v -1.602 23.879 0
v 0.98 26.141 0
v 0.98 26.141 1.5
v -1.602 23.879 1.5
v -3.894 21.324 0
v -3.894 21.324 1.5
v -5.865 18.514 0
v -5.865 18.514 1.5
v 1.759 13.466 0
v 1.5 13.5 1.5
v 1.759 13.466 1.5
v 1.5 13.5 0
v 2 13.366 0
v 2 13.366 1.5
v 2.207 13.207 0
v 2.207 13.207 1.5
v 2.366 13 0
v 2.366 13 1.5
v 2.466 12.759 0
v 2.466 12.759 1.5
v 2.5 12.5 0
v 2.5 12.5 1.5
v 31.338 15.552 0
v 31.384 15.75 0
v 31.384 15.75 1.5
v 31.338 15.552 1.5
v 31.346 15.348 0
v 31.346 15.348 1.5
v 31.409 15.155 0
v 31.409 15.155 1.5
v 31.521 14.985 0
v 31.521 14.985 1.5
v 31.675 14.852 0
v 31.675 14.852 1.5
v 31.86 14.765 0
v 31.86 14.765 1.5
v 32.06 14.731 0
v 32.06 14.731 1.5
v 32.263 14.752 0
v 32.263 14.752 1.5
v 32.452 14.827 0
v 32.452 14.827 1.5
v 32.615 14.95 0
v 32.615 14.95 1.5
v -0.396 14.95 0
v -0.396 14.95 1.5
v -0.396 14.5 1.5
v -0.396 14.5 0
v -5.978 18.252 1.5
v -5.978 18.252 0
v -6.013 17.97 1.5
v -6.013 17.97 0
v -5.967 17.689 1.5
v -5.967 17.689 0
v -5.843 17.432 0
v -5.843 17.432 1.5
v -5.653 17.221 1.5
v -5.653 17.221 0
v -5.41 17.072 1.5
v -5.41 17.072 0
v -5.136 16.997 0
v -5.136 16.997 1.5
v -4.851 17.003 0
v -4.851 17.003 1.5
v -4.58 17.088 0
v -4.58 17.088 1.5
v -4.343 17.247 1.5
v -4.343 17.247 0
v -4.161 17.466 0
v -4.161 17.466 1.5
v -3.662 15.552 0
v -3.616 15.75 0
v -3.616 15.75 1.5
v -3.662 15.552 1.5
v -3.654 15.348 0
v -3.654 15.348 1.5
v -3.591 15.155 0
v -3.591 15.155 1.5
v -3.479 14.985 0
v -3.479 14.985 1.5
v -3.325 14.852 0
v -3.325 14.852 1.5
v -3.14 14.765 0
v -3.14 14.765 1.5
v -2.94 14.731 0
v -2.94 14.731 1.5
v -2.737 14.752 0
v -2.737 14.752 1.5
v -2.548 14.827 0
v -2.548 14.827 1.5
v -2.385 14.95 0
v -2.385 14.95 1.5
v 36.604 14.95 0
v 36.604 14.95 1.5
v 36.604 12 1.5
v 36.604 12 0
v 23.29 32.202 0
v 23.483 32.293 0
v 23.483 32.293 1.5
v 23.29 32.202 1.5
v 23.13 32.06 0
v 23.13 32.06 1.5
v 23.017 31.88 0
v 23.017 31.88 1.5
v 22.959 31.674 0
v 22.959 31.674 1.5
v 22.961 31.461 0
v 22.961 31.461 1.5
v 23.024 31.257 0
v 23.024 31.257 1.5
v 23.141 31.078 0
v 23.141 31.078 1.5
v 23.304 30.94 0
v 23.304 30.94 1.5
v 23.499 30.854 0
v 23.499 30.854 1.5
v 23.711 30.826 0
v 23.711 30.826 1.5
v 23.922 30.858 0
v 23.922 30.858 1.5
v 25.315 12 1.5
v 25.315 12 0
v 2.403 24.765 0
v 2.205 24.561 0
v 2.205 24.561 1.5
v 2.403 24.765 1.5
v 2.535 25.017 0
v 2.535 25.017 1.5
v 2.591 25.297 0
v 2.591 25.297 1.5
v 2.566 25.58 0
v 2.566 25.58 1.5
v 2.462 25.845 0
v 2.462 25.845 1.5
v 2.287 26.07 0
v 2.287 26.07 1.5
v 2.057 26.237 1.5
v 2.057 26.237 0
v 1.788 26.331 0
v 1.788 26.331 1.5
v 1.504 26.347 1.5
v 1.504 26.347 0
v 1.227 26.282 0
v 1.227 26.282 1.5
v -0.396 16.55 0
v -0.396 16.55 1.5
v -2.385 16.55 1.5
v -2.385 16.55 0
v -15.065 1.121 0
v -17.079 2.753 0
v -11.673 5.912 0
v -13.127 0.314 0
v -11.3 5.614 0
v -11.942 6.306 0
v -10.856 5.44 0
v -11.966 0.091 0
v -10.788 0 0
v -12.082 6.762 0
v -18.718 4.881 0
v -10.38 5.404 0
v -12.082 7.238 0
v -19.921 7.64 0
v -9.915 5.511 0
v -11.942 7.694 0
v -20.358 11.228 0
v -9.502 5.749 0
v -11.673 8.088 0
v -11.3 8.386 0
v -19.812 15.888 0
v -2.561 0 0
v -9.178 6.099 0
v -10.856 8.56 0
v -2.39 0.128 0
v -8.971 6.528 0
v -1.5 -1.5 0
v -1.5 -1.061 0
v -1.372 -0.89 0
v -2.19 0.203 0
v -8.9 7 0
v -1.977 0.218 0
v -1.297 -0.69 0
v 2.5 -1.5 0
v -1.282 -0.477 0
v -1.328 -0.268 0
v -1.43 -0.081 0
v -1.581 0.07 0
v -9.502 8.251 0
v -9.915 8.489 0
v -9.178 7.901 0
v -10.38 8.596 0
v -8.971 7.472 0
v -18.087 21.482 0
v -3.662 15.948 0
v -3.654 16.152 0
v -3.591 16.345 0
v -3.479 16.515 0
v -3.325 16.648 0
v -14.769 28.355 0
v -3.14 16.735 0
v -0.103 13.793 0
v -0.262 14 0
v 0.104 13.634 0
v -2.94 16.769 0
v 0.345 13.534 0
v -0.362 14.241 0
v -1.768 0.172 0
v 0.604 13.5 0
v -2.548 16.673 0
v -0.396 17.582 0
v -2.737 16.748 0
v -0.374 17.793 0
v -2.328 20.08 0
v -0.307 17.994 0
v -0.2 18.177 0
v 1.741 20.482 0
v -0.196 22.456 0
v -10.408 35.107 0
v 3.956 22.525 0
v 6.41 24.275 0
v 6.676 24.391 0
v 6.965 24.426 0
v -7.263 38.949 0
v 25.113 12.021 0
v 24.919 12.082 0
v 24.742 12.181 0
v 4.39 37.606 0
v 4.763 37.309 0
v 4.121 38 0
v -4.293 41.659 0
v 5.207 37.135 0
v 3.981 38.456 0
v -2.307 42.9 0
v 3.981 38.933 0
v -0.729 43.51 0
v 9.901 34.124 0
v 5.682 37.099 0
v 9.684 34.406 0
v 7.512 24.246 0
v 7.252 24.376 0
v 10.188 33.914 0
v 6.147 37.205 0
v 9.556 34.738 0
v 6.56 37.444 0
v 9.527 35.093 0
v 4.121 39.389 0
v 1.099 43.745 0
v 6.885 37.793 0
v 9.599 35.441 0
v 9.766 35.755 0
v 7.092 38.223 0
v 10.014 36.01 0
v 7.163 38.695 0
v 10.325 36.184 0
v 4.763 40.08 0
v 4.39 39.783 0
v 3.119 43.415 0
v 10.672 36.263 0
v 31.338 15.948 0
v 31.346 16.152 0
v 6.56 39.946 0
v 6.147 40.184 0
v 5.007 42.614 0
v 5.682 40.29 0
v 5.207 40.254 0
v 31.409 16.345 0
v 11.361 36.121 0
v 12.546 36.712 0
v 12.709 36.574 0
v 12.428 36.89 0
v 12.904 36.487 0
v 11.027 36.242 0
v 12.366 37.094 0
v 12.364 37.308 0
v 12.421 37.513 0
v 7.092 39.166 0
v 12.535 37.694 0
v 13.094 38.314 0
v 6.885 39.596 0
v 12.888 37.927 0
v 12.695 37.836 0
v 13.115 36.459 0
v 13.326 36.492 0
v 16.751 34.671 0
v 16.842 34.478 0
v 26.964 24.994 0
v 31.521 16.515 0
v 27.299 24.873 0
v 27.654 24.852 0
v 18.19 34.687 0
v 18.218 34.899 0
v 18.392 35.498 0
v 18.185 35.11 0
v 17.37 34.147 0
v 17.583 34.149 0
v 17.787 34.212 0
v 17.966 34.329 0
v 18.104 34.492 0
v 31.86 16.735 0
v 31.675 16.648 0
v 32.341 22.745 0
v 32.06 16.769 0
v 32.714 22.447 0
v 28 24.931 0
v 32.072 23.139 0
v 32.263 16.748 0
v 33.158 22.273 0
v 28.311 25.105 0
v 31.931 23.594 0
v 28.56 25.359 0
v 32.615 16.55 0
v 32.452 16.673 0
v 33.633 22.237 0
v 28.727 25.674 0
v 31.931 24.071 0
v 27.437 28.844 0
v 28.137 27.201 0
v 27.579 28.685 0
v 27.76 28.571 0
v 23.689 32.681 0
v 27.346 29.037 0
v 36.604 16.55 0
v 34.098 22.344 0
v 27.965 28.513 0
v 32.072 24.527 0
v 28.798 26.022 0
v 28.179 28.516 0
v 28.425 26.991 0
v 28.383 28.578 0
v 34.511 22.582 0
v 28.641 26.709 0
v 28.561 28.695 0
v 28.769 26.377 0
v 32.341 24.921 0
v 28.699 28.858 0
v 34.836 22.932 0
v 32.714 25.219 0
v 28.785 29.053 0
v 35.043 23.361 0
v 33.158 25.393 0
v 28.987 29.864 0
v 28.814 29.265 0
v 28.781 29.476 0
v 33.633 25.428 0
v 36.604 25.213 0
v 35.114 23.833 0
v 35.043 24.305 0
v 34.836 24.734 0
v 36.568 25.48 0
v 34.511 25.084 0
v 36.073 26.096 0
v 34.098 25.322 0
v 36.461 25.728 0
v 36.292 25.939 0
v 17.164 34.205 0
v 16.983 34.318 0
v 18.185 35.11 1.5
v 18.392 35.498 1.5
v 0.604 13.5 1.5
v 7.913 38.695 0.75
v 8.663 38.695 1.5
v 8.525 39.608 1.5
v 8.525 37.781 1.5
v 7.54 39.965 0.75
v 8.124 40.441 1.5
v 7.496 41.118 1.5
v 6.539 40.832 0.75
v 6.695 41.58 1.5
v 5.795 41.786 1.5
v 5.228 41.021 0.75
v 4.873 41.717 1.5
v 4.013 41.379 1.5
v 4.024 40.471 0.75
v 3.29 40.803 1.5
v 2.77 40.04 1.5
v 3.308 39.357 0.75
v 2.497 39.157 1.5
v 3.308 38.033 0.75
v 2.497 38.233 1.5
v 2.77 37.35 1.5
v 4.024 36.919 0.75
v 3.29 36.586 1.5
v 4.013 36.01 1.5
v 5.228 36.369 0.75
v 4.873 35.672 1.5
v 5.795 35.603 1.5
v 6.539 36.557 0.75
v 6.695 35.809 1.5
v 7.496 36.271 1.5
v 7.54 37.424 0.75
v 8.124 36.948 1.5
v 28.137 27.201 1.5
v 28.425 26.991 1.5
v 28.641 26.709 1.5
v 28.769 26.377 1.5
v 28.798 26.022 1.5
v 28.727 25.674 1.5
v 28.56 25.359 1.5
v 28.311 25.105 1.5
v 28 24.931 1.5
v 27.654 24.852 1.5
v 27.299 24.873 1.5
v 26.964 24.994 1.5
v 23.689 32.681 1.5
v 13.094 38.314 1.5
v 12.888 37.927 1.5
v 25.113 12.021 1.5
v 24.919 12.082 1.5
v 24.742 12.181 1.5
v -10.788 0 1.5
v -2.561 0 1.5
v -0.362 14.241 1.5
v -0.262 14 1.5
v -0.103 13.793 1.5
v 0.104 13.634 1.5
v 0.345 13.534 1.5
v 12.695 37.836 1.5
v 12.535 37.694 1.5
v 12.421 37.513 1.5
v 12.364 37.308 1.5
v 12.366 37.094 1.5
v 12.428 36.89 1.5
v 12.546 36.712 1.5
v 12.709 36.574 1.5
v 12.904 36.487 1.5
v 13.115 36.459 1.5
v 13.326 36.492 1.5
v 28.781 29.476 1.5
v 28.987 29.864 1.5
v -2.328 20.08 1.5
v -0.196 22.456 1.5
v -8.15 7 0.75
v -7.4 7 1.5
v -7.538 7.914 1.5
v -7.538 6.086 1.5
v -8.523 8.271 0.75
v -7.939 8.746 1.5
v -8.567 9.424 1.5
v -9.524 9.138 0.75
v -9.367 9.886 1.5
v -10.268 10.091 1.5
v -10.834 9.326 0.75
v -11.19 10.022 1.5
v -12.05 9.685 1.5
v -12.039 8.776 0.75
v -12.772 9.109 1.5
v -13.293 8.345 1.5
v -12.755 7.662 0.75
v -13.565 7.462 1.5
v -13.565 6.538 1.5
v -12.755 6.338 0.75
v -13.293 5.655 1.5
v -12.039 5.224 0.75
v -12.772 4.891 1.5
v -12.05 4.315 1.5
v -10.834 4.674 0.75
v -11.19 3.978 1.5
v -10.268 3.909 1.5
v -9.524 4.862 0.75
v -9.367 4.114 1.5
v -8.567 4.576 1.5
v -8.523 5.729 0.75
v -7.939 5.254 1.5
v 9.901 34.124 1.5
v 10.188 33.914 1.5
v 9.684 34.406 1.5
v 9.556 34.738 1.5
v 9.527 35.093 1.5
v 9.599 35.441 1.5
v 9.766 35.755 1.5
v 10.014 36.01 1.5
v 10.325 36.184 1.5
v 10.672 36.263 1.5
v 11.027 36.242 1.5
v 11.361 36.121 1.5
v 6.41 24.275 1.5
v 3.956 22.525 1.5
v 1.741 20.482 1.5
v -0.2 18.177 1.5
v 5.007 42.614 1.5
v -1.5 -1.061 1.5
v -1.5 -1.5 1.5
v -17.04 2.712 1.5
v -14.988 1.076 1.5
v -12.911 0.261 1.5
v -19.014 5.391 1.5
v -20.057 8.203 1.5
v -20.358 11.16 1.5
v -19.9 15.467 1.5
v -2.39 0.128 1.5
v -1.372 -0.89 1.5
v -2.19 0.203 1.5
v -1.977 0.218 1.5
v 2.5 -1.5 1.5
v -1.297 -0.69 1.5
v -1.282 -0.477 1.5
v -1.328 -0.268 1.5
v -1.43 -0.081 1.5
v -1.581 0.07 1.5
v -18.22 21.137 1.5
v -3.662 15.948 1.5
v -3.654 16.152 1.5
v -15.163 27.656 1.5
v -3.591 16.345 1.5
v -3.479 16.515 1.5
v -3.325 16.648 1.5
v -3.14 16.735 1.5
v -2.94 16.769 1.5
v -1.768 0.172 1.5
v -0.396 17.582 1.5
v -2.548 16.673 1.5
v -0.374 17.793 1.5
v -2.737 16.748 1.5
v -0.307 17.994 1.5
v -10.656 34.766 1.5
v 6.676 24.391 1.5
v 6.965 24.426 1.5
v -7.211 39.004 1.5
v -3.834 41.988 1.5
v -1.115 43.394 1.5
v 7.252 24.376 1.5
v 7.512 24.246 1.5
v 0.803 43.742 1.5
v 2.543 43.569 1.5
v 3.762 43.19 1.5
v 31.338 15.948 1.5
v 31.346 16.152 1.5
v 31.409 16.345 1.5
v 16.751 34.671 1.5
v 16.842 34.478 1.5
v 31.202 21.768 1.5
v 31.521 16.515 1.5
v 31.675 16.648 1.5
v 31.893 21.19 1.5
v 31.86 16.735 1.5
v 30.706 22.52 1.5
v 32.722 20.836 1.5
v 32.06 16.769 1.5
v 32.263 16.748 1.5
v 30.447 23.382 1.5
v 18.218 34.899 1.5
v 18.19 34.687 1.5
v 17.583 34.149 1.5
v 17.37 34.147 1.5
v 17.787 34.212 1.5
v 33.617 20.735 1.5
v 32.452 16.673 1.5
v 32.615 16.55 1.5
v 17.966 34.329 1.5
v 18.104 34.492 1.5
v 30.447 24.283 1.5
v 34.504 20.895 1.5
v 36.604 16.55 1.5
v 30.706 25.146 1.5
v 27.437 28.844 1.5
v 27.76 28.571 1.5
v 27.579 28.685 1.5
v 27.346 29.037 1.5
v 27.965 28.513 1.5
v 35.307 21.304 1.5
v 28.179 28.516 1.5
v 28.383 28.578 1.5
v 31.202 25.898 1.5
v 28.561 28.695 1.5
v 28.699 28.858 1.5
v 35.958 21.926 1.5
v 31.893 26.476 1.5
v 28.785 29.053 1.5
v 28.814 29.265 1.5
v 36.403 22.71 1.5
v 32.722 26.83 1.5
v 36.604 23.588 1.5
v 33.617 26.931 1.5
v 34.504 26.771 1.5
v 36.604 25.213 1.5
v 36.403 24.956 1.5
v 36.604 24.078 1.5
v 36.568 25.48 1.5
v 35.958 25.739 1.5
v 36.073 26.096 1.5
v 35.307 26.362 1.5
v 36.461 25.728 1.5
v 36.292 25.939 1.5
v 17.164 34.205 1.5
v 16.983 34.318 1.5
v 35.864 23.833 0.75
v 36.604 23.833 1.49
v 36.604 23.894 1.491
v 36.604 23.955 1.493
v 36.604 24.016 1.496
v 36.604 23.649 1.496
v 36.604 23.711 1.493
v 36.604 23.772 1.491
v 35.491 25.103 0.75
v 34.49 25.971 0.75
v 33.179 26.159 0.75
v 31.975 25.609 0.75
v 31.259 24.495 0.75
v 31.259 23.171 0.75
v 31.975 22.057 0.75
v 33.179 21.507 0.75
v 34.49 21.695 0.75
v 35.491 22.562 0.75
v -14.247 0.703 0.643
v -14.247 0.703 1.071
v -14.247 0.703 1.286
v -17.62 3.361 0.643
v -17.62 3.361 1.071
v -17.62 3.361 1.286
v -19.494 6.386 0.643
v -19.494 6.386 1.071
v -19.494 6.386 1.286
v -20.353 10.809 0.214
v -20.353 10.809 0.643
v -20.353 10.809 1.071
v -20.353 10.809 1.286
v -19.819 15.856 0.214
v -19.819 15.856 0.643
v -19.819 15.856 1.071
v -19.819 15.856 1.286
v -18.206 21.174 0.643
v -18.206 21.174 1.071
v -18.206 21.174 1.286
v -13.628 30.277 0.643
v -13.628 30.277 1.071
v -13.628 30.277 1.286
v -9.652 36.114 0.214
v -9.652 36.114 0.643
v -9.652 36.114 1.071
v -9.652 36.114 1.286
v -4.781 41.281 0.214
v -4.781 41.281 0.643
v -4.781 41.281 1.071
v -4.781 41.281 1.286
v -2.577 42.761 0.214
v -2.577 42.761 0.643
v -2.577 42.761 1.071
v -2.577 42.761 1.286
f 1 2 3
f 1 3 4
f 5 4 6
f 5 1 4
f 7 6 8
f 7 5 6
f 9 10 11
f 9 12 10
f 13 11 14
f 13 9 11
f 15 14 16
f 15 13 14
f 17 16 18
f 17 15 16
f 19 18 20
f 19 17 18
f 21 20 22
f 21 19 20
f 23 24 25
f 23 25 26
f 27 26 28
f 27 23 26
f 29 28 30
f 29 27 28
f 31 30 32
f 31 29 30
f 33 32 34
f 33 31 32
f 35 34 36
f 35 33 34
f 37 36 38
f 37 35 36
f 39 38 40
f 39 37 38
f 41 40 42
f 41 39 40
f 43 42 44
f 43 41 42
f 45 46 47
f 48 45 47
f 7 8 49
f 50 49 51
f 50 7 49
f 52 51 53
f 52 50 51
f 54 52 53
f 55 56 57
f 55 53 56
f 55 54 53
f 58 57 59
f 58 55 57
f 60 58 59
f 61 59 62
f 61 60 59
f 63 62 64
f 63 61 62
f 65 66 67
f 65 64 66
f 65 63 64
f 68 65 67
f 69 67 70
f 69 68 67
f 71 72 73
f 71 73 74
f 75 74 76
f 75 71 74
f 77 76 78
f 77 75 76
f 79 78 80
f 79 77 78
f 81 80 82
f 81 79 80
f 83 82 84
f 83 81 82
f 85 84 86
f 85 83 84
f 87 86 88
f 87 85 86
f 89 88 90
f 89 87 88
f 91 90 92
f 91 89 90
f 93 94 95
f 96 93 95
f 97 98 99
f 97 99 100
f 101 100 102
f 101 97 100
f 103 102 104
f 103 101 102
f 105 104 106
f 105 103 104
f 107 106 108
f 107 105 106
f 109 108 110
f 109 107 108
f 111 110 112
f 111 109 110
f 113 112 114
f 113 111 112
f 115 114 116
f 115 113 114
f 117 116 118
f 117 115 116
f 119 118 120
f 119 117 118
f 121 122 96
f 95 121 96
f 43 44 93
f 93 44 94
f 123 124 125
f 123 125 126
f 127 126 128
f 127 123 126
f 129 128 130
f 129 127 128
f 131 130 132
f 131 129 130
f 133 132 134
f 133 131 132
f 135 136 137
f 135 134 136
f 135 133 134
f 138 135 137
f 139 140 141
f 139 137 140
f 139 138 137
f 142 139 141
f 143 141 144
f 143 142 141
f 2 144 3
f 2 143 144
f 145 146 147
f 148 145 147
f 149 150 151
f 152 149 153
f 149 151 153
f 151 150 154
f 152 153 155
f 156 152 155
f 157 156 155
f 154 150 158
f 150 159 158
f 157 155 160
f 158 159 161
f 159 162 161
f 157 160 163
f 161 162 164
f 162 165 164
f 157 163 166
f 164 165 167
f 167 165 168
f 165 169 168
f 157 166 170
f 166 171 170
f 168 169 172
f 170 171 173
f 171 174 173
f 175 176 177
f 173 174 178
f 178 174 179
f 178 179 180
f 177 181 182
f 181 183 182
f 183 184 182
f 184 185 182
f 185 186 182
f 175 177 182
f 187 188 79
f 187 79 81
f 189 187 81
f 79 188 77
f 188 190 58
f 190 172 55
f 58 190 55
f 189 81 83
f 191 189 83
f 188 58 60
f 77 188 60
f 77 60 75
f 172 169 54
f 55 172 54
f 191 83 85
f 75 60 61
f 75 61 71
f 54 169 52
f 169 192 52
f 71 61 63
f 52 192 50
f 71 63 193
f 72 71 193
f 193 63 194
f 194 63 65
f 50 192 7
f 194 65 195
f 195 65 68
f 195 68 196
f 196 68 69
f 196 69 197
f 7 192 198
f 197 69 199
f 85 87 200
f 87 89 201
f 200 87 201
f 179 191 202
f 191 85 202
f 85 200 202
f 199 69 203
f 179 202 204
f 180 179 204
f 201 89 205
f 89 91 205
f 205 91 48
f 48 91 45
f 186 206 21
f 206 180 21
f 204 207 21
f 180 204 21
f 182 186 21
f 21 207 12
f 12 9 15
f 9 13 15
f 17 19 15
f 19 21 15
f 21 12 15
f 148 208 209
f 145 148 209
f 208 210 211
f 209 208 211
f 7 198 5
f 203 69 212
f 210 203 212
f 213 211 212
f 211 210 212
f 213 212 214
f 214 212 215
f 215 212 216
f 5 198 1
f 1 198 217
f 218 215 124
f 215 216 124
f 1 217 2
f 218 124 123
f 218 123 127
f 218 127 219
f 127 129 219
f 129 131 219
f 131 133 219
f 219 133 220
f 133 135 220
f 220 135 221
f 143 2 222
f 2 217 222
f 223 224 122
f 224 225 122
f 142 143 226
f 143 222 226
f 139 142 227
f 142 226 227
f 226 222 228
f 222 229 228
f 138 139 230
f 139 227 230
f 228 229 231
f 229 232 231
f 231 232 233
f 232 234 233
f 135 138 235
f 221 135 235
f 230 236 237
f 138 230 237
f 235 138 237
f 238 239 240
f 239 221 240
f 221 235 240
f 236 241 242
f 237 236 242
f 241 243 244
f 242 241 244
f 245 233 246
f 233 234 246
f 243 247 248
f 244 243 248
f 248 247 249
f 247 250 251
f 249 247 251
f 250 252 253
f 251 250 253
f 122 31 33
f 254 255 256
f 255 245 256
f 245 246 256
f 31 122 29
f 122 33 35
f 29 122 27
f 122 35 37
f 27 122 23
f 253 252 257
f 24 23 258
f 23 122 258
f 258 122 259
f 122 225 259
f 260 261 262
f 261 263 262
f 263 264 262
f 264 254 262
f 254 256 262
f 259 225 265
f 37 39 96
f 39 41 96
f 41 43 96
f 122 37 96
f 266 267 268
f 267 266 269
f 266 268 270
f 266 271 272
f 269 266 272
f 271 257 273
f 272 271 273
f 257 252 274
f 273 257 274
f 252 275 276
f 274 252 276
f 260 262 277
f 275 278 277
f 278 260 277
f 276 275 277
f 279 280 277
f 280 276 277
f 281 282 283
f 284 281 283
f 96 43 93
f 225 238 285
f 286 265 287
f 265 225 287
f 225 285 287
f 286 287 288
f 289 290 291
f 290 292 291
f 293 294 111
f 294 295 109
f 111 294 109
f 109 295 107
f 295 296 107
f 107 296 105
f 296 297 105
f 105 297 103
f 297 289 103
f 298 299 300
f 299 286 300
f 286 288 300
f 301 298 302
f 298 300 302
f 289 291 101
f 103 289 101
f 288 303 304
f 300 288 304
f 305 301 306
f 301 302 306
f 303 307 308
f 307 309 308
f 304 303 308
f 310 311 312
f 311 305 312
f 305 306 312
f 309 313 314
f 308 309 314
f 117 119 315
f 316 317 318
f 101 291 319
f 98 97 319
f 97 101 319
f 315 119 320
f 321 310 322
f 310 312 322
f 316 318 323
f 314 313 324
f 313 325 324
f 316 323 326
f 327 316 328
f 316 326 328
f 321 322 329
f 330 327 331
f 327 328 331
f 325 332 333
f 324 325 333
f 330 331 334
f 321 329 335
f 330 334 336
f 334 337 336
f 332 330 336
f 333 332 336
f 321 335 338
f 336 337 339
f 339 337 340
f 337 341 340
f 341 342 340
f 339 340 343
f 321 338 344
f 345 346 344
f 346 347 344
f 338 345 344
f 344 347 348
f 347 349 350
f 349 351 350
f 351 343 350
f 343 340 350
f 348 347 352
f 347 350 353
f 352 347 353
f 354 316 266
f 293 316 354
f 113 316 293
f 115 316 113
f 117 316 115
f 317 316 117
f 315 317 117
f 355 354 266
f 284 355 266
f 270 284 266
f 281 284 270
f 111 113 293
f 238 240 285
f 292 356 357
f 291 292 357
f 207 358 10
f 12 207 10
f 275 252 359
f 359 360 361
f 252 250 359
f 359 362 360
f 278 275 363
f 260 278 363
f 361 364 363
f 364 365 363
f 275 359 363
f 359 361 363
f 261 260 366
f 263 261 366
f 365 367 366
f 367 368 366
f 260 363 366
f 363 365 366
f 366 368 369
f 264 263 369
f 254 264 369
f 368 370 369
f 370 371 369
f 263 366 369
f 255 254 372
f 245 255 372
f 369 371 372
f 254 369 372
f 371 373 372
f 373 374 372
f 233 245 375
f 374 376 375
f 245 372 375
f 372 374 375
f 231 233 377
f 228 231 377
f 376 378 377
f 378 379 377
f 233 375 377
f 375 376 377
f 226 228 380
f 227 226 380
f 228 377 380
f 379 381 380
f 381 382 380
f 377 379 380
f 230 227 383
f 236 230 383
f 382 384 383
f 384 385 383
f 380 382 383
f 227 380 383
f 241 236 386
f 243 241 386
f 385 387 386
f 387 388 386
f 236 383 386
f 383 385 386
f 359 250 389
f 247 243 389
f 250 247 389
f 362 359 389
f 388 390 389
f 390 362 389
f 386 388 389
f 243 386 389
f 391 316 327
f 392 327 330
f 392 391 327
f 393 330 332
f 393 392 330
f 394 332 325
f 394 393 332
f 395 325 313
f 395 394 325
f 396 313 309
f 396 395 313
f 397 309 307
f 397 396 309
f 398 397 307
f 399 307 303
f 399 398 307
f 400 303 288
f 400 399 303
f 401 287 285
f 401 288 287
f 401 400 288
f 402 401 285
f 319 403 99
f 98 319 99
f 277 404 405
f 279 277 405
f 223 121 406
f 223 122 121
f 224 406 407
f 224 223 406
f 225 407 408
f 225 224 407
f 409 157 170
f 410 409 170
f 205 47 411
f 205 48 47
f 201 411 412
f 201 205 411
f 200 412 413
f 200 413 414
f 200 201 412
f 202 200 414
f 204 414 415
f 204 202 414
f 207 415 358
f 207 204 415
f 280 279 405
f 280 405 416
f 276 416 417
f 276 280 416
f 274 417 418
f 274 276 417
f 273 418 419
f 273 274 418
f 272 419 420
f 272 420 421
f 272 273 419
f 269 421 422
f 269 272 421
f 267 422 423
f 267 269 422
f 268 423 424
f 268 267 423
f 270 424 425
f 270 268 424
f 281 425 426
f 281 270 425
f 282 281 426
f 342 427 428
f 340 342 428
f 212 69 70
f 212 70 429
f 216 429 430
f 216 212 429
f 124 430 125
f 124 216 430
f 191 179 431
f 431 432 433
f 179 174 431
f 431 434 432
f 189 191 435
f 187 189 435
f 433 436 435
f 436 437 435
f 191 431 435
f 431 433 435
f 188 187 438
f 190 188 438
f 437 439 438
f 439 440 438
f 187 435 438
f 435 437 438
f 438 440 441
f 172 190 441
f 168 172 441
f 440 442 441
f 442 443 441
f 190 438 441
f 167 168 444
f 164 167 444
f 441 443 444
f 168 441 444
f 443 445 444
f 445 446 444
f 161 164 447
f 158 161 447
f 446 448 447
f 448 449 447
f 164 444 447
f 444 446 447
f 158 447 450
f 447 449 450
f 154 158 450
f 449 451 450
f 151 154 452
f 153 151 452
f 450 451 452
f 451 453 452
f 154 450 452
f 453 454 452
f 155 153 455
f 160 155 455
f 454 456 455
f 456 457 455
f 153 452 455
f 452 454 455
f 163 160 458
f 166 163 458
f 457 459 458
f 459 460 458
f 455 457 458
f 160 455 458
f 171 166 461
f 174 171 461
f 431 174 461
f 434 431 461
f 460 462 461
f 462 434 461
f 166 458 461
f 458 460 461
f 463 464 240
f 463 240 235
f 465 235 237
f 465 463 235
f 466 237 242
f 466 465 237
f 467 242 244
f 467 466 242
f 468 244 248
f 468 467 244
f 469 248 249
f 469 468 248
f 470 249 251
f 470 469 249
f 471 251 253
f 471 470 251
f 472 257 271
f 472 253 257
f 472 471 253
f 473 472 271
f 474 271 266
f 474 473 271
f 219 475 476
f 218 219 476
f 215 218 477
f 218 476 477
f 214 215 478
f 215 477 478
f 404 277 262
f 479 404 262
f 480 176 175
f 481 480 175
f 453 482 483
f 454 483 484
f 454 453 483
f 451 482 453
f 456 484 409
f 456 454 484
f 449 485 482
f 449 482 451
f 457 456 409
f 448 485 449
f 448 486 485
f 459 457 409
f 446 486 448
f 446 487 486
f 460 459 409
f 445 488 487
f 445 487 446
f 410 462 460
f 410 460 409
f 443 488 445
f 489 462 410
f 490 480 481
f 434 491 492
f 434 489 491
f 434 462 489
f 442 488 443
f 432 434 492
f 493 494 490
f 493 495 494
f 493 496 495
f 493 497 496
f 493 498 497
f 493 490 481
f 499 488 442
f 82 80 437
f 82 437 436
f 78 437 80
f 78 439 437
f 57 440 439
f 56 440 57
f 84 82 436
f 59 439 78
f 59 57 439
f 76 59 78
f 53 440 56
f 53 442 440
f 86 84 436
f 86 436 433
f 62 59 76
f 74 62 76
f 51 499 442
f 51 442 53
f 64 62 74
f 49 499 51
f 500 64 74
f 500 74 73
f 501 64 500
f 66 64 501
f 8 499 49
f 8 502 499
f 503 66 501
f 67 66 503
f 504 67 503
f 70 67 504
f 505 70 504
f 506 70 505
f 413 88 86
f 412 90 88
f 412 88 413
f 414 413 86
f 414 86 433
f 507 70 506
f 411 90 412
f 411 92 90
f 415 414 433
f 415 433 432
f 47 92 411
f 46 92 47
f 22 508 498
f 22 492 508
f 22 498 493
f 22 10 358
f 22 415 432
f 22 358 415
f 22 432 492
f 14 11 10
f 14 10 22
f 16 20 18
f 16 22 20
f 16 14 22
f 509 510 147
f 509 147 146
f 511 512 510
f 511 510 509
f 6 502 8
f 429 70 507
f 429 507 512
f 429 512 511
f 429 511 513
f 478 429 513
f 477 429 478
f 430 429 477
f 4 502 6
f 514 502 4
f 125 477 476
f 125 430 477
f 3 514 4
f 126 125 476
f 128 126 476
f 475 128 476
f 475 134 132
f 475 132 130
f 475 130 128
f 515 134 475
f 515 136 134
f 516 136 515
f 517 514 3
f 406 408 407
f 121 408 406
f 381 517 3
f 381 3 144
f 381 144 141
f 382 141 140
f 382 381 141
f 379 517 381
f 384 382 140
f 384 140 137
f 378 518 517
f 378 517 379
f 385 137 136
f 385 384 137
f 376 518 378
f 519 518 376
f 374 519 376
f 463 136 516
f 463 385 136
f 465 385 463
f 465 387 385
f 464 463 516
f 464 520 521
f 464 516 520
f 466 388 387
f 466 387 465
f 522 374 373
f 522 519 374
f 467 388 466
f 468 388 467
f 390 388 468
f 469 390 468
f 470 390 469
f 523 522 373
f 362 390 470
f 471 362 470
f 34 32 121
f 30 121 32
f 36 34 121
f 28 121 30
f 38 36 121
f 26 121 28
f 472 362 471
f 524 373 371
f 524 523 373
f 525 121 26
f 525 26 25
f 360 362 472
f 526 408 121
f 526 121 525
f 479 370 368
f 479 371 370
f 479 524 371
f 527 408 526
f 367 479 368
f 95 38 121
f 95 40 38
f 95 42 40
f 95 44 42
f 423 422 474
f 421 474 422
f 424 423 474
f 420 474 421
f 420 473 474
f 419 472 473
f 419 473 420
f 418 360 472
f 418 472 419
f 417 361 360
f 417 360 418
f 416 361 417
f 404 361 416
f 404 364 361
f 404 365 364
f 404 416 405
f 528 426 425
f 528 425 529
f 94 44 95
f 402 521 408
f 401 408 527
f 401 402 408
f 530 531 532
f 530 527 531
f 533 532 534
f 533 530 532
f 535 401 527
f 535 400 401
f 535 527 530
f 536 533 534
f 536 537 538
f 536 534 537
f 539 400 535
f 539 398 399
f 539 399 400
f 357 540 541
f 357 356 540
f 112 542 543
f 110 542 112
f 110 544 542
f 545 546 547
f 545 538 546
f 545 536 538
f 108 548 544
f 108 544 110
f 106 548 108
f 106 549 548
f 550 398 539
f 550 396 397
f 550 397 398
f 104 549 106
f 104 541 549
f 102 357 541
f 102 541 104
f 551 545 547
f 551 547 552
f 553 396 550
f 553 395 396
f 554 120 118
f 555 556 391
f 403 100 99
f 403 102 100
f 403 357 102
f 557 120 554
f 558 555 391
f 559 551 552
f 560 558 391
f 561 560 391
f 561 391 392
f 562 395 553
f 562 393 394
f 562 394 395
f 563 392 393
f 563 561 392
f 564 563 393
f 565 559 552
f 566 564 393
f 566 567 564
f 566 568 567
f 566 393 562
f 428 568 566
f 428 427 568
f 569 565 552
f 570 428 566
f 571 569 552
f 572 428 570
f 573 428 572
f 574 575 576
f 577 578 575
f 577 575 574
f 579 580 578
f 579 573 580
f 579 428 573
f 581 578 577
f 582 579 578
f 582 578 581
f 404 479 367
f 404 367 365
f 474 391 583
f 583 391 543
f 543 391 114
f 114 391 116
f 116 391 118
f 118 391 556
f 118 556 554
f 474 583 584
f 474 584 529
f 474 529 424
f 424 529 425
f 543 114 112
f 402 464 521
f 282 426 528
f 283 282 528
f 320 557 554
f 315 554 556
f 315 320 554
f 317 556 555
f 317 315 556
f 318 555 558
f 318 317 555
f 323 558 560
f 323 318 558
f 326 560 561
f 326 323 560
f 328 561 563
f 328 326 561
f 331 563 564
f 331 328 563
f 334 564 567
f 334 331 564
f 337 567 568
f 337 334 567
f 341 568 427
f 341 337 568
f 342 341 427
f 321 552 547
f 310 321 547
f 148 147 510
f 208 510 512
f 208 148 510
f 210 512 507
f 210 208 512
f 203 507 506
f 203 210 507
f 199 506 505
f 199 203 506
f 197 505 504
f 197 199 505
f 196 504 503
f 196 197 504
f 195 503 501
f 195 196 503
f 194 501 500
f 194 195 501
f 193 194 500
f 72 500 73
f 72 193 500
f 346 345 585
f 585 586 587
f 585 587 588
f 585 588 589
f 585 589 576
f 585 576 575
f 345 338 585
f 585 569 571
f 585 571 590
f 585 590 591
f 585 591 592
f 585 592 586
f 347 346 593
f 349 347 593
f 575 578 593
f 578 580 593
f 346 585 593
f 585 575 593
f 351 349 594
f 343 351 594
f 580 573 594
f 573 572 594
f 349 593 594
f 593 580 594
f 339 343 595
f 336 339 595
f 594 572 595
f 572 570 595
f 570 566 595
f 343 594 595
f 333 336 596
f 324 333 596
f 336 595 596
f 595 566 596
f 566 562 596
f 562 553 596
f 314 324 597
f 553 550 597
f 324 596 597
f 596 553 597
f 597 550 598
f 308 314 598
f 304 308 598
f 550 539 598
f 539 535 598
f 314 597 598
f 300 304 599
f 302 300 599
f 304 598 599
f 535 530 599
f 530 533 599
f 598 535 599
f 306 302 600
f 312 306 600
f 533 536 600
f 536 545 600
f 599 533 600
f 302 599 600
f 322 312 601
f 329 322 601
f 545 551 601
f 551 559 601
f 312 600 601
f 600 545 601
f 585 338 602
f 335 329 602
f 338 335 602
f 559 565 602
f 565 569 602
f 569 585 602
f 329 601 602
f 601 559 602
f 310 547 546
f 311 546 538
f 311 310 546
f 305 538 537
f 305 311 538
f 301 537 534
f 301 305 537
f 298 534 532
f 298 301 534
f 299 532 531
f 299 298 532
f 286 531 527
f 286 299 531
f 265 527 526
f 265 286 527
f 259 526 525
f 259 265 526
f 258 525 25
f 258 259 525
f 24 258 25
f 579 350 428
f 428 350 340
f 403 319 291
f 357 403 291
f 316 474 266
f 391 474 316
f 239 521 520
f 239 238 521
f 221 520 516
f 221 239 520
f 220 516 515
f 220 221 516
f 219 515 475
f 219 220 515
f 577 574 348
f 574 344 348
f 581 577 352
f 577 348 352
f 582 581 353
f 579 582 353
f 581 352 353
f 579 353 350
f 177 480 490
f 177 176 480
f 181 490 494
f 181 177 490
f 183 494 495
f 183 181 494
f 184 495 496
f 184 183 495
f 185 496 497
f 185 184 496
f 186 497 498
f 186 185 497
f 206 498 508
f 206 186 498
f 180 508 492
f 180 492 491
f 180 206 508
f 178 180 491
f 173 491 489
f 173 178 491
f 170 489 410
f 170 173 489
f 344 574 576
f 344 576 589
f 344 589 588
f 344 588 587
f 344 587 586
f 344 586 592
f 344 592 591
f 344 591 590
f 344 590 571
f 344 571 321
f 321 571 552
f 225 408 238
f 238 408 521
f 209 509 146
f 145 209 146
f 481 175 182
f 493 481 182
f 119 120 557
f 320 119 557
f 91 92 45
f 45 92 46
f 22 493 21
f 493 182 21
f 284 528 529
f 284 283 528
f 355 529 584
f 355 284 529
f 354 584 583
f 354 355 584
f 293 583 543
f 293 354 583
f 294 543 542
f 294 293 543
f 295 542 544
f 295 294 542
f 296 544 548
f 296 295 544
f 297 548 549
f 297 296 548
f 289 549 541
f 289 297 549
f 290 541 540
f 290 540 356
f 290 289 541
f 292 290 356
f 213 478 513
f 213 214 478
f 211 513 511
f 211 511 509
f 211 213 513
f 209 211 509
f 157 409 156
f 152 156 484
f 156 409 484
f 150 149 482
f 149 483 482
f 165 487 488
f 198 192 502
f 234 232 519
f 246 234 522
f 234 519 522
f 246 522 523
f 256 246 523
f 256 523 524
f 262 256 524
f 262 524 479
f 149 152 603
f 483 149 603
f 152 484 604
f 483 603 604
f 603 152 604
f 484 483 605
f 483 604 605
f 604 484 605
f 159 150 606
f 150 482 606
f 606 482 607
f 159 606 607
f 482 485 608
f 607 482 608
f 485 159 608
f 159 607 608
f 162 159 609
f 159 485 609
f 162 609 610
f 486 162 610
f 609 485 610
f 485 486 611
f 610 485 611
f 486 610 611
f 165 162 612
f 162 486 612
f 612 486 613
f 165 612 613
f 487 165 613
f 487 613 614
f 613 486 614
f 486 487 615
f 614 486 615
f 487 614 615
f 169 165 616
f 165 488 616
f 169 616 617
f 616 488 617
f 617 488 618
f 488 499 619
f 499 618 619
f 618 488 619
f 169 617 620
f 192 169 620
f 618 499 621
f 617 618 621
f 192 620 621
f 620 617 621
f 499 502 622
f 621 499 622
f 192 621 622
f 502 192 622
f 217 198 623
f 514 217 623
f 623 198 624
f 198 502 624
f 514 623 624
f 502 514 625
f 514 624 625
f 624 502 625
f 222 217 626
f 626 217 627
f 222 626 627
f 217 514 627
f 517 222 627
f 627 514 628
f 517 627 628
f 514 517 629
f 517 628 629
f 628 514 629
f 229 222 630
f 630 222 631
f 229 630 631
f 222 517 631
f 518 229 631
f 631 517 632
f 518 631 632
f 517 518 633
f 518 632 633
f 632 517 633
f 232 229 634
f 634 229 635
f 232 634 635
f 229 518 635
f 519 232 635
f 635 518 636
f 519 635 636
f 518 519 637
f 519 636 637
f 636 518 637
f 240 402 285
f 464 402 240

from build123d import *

# Parameters (mm, degrees)
BASE_DEPTH                        = 1.5
CAMERA_CUT_REACH                  = 81.23
TOP_COVER_SOCKETS_REACH           = 81.23
SKETCH4_W                         = 5
SKETCH4_H                         = 1.5
STANDOFF_HOLE_REACH               = 62.831
SKETCH5_R                         = 1.6
GOPRO_MOUNT_HOLDERS_REACH         = 62.831
CAMERA_ANGLE_ADJUSTMENT_CUT_REACH = 62.831
FILLET6_R                         = 1
MILLING_START                     = -1.5
SKETCH10_R                        = 0.75
MILLING_HOLES_DEPTH               = 1.5
GOPRO_STRAP_REACH                 = 62.831
CHAMFER1_SIZE                     = 1.5
FRONT_CURVE_REACH                 = 62.831
FILLET7_R                         = 1


with BuildPart() as part:
    # Sketch1 → Base (new body)
    with BuildSketch(Plane.XY):
        Polygon((2.5, 0), (0, 0), (-1.5, 0), (-1.5, -1.5), (2.5, -1.5), align=None)
        Polygon((-1.5, 0), (0, 0), (2.5, 0), (2.5, 12), (62.584278166, 12), (-6.179064047, 48.562117607), (-32, 0), align=None)
    extrude(amount=BASE_DEPTH)

    # Sketch3 → Camera cut (cut, up to next)
    with BuildSketch(Plane.XY.offset(1.5), mode=Mode.PRIVATE) as camera_cut_sk1:
        with BuildLine():
            Line((2.5, 12), (25, 12))
            Line((25, 12), (6.978655026, 24.6186816))
            ThreePointArc((6.978655026, 24.6186816), (2.93893247, 21.650461355), (-0.396076952, 17.907814978))
            Line((-0.396076952, 17.907814978), (-0.396076952, 13.5))
            Line((-0.396076952, 13.5), (2.5, 13.5))
            Line((2.5, 13.5), (2.5, 12))
        make_face()
    camera_cut_tool1 = extrude(camera_cut_sk1.sketch, amount=-CAMERA_CUT_REACH, mode=Mode.PRIVATE) & part.part
    add(camera_cut_tool1.solids().sort_by_distance((9.594765, 16.626253, 1.5))[0], mode=Mode.SUBTRACT)

    # Sketch4 → Top cover sockets (cut, up to next)
    with BuildSketch(Plane.XY.offset(1.5), mode=Mode.PRIVATE) as top_cover_sockets_sk1:
        Polygon((36.603923048, 16.5), (36.603923048, 15), (36.603923048, 14.95), (36.603923048, 12), (62.584278166, 12), (36.603923048, 25.813999854), (36.603923048, 16.55), align=None)
    top_cover_sockets_tool1 = extrude(top_cover_sockets_sk1.sketch, amount=-TOP_COVER_SOCKETS_REACH, mode=Mode.PRIVATE) & part.part
    # Sketch4 → Top cover sockets (cut, up to next)
    with BuildSketch(Plane.XY.offset(1.5), mode=Mode.PRIVATE) as top_cover_sockets_sk2:
        with Locations((34.103923048, 15.75)):
            Rectangle(SKETCH4_W, SKETCH4_H)
    top_cover_sockets_tool2 = extrude(top_cover_sockets_sk2.sketch, amount=-TOP_COVER_SOCKETS_REACH, mode=Mode.PRIVATE) & part.part
    # Sketch4 → Top cover sockets (cut, up to next)
    with BuildSketch(Plane.XY.offset(1.5), mode=Mode.PRIVATE) as top_cover_sockets_sk3:
        Polygon((36.603923048, 14.95), (36.603923048, 15), (31.603923048, 15), (31.603923048, 16.5), (36.603923048, 16.5), (36.603923048, 16.55), (31.553923048, 16.55), (31.553923048, 14.95), align=None)
    top_cover_sockets_tool3 = extrude(top_cover_sockets_sk3.sketch, amount=-TOP_COVER_SOCKETS_REACH, mode=Mode.PRIVATE) & part.part
    # Sketch4 → Top cover sockets (cut, up to next)
    with BuildSketch(Plane.XY.offset(1.5), mode=Mode.PRIVATE) as top_cover_sockets_sk4:
        Polygon((-0.396076952, 16.55), (-3.446076952, 16.55), (-3.446076952, 14.95), (-0.396076952, 14.95), (-0.396076952, 15), (-3.396076952, 15), (-3.396076952, 16.5), (-0.396076952, 16.5), align=None)
    top_cover_sockets_tool4 = extrude(top_cover_sockets_sk4.sketch, amount=-TOP_COVER_SOCKETS_REACH, mode=Mode.PRIVATE) & part.part
    add(top_cover_sockets_tool1.solids().sort_by_distance((45.264041, 16.604667, 1.5))[0], mode=Mode.SUBTRACT)
    add(top_cover_sockets_tool2.solids().sort_by_distance((34.103923, 15.75, 1.5))[0], mode=Mode.SUBTRACT)
    add(top_cover_sockets_tool3.solids().sort_by_distance((36.550949, 14.975, 1.5))[0], mode=Mode.SUBTRACT)
    add(top_cover_sockets_tool4.solids().sort_by_distance((-1.921077, 16.515558, 1.5))[0], mode=Mode.SUBTRACT)


with BuildPart() as top_cover_sockets_kept_piece:
    # of the separate pieces the step leaves, the one the design keeps (top_cover_sockets_pieces_kept)
    add(part.part.solids().sort_by_distance((-6.179064047, 48.562117607, 0))[0])

    # Sketch5 → Standoff hole (cut, up to next)
    with BuildSketch(Plane.XY.offset(1.5), mode=Mode.PRIVATE) as standoff_hole_sk1:
        with Locations((5.562840845, 38.694611868)):
            Circle(SKETCH5_R)
    standoff_hole_tool1 = extrude(standoff_hole_sk1.sketch, amount=-STANDOFF_HOLE_REACH, mode=Mode.PRIVATE) & top_cover_sockets_kept_piece.part
    # Sketch5 → Standoff hole (cut, up to next)
    with BuildSketch(Plane.XY.offset(1.5), mode=Mode.PRIVATE) as standoff_hole_sk2:
        with Locations((33.513606473, 23.832926162)):
            Circle(SKETCH5_R)
    standoff_hole_tool2 = extrude(standoff_hole_sk2.sketch, amount=-STANDOFF_HOLE_REACH, mode=Mode.PRIVATE) & top_cover_sockets_kept_piece.part
    # Sketch5 → Standoff hole (cut, up to next)
    with BuildSketch(Plane.XY.offset(1.5), mode=Mode.PRIVATE) as standoff_hole_sk3:
        with Locations((-10.5, 7)):
            Circle(SKETCH5_R)
    standoff_hole_tool3 = extrude(standoff_hole_sk3.sketch, amount=-STANDOFF_HOLE_REACH, mode=Mode.PRIVATE) & top_cover_sockets_kept_piece.part
    add(standoff_hole_tool1.solids().sort_by_distance((5.562841, 38.694612, 1.5))[0], mode=Mode.SUBTRACT)
    add(standoff_hole_tool2.solids().sort_by_distance((33.513606, 23.832926, 1.5))[0], mode=Mode.SUBTRACT)
    add(standoff_hole_tool3.solids().sort_by_distance((-10.5, 7, 1.5))[0], mode=Mode.SUBTRACT)

    # Sketch6 → Gopro mount holders (cut, up to next)
    with BuildSketch(Plane.XY.offset(1.5), mode=Mode.PRIVATE) as gopro_mount_holders_sk1:
        Polygon((18.391689882, 35.497616), (13.094004325, 38.314445377), (12.38979698, 36.990023988), (17.687482537, 34.173194611), align=None)
    gopro_mount_holders_tool1 = extrude(gopro_mount_holders_sk1.sketch, amount=-GOPRO_MOUNT_HOLDERS_REACH, mode=Mode.PRIVATE) & top_cover_sockets_kept_piece.part
    # Sketch6 → Gopro mount holders (cut, up to next)
    with BuildSketch(Plane.XY.offset(1.5), mode=Mode.PRIVATE) as gopro_mount_holders_sk2:
        Polygon((28.987060996, 29.863957247), (23.689375439, 32.680786624), (22.985168095, 31.356365234), (28.282853652, 28.539535858), align=None)
    gopro_mount_holders_tool2 = extrude(gopro_mount_holders_sk2.sketch, amount=-GOPRO_MOUNT_HOLDERS_REACH, mode=Mode.PRIVATE) & top_cover_sockets_kept_piece.part
    add(gopro_mount_holders_tool1.solids().sort_by_distance((15.390743, 36.24382, 1.5))[0], mode=Mode.SUBTRACT)
    add(gopro_mount_holders_tool2.solids().sort_by_distance((25.986115, 30.610161, 1.5))[0], mode=Mode.SUBTRACT)

    # Sketch9 → Camera angle adjustment cut (cut, up to next)
    with BuildSketch(Plane.XY, mode=Mode.PRIVATE) as camera_angle_adjustment_cut_sk1:
        with BuildLine():
            ThreePointArc((-5.864731087, 18.513504832), (-5.536990387, 17.137791914), (-4.161277468, 17.465532614))
            ThreePointArc((-4.161277468, 17.465532614), (-1.297808632, 21.300050039), (2.205242111, 24.560665496))
            ThreePointArc((2.205242111, 24.560665496), (2.382581962, 25.963715951), (0.979531507, 26.141055801))
            ThreePointArc((0.979531507, 26.141055801), (-2.786387825, 22.635764075), (-5.864731087, 18.513504832))
        make_face()
    camera_angle_adjustment_cut_tool1 = extrude(camera_angle_adjustment_cut_sk1.sketch, amount=CAMERA_ANGLE_ADJUSTMENT_CUT_REACH, mode=Mode.PRIVATE) & top_cover_sockets_kept_piece.part
    add(camera_angle_adjustment_cut_tool1.solids().sort_by_distance((-1.901224, 21.8415, 0))[0], mode=Mode.SUBTRACT)

    # Fillet6
    fillet6_edges = [top_cover_sockets_kept_piece.edges().sort_by_distance(p)[0] for p in [
        (36.603923048, 25.813999854, 0.75),
    ]]
    fillet(fillet6_edges, radius=FILLET6_R)

    # Sketch10 → Milling holes (cut)
    with BuildSketch(Plane.XY.offset(1.5).offset(MILLING_START)):
        with Locations((-2.915746866, 15.480330086)):
            Circle(SKETCH10_R)
        with Locations((-2.915746866, 16.019669914)):
            Circle(SKETCH10_R)
        with Locations((13.107025547, 37.209302766)):
            Circle(SKETCH10_R)
        with Locations((23.702396662, 31.575644013)):
            Circle(SKETCH10_R)
        with Locations((17.468203759, 34.890423178)):
            Circle(SKETCH10_R)
        with Locations((28.063574873, 29.256764425)):
            Circle(SKETCH10_R)
        with Locations((32.084253134, 16.019669914)):
            Circle(SKETCH10_R)
        with Locations((32.084253134, 15.480330086)):
            Circle(SKETCH10_R)
        with Locations((-2.030330086, -0.530330086)):
            Circle(SKETCH10_R)
    extrude(amount=MILLING_HOLES_DEPTH, mode=Mode.SUBTRACT)

    # Sketch11 → Gopro strap (cut, up to next)
    with BuildSketch(Plane.XY.offset(1.5), mode=Mode.PRIVATE) as gopro_strap_sk1:
        with BuildLine():
            Line((11.36148373, 36.121075278), (28.137487995, 27.201115585))
            ThreePointArc((28.137487995, 27.201115585), (28.654333032, 25.510591641), (26.963809088, 24.993746603))
            Line((26.963809088, 24.993746603), (10.187804823, 33.913706296))
            ThreePointArc((10.187804823, 33.913706296), (9.670959786, 35.604230241), (11.36148373, 36.121075278))
        make_face()
    gopro_strap_tool1 = extrude(gopro_strap_sk1.sketch, amount=-GOPRO_STRAP_REACH, mode=Mode.PRIVATE) & top_cover_sockets_kept_piece.part
    add(gopro_strap_tool1.solids().sort_by_distance((19.162646, 30.557411, 1.5))[0], mode=Mode.SUBTRACT)

    # Chamfer1
    # the kernel refuses this chamfer: 1.5 mm, written as the material it takes off along each edge
    with BuildSketch(Plane(origin=(5.562840845, 38.694611868, 1.5), x_dir=(1, 0, 0), z_dir=(0, -1, 0))) as chamfer1_piece_1:
        Polygon((1.6, -CHAMFER1_SIZE), (1.6 + CHAMFER1_SIZE, 0), (1.6, 0), align=None)
    revolve(axis=Axis((5.562840845, 38.694611868, 1.5), (0, 0, 1)), mode=Mode.SUBTRACT)
    with BuildSketch(Plane(origin=(-10.5, 7, 1.5), x_dir=(1, 0, 0), z_dir=(0, -1, 0))) as chamfer1_piece_2:
        Polygon((1.6, -CHAMFER1_SIZE), (1.6 + CHAMFER1_SIZE, 0), (1.6, 0), align=None)
    revolve(axis=Axis((-10.5, 7, 1.5), (0, 0, 1)), mode=Mode.SUBTRACT)
    with BuildSketch(Plane(origin=(33.513606473, 23.832926162, 1.5), x_dir=(1, 0, 0), z_dir=(0, -1, 0))) as chamfer1_piece_3:
        Polygon((1.6, -CHAMFER1_SIZE), (1.6 + CHAMFER1_SIZE, 0), (1.6, 0), align=None)
    revolve(axis=Axis((33.513606473, 23.832926162, 1.5), (0, 0, 1)), mode=Mode.SUBTRACT)

    # Sketch12 → Front curve (cut, up to next)
    with BuildSketch(Plane.XY.offset(1.5), mode=Mode.PRIVATE) as front_curve_sk1:
        with BuildLine():
            add(Edge.make_bspline(
                [(-10.787702076, 0), (-13.145719201, 0.07852966), (-16.071191812, 0.861478335), (-22.218808251, 9.989827447), (-18.926124359, 21.122538368), (-12.592194116, 32.182950864), (-7.521693168, 39.527230078), (-0.478907967, 44.275086805), (2.453961219, 43.977408771), (5.050339622, 42.591337765)],
                knots=[0.040175263, 0.040175263, 0.040175263, 0.040175263, 0.255853288, 0.322794217, 0.630896498, 0.688624595, 0.842347088, 0.87540616, 1, 1, 1, 1], degree=3))
            Line((5.050339622, 42.591337765), (-6.179064047, 48.562117607))
            Line((-6.179064047, 48.562117607), (-32, 0))
            Line((-32, 0), (-10.787702076, 0))
        make_face()
    front_curve_tool1 = extrude(front_curve_sk1.sketch, amount=-FRONT_CURVE_REACH, mode=Mode.PRIVATE) & top_cover_sockets_kept_piece.part
    add(front_curve_tool1.solids().sort_by_distance((-0.851125, 45.037406, 1.5))[0], mode=Mode.SUBTRACT)

    # Fillet7
    fillet7_edges = [top_cover_sockets_kept_piece.edges().sort_by_distance(p)[0] for p in [
        (-0.396076952, 17.907814978, 0.75),
        (6.978655026, 24.6186816, 0.75),
        (25, 12, 0.75),
        (2.5, 13.5, 0.75),
        (-0.396076952, 13.5, 0.75),
    ]]
    fillet(fillet7_edges, radius=FILLET7_R)


solid = top_cover_sockets_kept_piece.part
